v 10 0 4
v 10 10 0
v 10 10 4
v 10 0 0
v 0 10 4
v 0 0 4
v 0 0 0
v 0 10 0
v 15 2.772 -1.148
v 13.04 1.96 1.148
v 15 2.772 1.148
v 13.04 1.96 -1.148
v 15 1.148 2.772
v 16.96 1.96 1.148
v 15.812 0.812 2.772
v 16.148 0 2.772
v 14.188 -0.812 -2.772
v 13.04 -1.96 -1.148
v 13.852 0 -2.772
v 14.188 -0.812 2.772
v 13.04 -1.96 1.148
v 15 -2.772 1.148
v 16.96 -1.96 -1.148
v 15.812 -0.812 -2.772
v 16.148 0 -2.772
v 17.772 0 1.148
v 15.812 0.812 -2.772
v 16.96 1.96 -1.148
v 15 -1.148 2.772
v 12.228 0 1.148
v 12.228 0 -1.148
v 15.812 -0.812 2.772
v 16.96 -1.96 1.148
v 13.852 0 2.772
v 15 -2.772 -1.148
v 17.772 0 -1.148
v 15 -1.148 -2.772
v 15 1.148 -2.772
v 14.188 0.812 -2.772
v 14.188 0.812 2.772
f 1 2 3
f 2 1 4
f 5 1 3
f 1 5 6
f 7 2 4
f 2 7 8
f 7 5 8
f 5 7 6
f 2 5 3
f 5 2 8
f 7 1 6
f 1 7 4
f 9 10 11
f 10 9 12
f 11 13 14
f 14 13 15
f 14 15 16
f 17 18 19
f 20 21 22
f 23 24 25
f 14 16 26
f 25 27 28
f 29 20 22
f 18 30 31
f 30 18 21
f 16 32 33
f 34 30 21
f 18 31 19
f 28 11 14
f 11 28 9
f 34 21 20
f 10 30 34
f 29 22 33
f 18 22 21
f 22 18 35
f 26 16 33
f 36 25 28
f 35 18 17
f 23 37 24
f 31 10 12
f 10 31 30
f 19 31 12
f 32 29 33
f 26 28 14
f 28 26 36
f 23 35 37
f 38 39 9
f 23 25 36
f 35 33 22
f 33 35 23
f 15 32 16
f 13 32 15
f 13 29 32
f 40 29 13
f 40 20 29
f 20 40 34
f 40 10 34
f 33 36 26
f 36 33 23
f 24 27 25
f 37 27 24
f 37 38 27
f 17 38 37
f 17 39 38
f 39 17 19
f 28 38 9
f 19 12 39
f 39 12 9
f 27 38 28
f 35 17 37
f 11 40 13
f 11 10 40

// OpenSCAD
cube([10,10,4]);
cube(-1);
translate([15,0,0]) sphere(3, $fn=8);
